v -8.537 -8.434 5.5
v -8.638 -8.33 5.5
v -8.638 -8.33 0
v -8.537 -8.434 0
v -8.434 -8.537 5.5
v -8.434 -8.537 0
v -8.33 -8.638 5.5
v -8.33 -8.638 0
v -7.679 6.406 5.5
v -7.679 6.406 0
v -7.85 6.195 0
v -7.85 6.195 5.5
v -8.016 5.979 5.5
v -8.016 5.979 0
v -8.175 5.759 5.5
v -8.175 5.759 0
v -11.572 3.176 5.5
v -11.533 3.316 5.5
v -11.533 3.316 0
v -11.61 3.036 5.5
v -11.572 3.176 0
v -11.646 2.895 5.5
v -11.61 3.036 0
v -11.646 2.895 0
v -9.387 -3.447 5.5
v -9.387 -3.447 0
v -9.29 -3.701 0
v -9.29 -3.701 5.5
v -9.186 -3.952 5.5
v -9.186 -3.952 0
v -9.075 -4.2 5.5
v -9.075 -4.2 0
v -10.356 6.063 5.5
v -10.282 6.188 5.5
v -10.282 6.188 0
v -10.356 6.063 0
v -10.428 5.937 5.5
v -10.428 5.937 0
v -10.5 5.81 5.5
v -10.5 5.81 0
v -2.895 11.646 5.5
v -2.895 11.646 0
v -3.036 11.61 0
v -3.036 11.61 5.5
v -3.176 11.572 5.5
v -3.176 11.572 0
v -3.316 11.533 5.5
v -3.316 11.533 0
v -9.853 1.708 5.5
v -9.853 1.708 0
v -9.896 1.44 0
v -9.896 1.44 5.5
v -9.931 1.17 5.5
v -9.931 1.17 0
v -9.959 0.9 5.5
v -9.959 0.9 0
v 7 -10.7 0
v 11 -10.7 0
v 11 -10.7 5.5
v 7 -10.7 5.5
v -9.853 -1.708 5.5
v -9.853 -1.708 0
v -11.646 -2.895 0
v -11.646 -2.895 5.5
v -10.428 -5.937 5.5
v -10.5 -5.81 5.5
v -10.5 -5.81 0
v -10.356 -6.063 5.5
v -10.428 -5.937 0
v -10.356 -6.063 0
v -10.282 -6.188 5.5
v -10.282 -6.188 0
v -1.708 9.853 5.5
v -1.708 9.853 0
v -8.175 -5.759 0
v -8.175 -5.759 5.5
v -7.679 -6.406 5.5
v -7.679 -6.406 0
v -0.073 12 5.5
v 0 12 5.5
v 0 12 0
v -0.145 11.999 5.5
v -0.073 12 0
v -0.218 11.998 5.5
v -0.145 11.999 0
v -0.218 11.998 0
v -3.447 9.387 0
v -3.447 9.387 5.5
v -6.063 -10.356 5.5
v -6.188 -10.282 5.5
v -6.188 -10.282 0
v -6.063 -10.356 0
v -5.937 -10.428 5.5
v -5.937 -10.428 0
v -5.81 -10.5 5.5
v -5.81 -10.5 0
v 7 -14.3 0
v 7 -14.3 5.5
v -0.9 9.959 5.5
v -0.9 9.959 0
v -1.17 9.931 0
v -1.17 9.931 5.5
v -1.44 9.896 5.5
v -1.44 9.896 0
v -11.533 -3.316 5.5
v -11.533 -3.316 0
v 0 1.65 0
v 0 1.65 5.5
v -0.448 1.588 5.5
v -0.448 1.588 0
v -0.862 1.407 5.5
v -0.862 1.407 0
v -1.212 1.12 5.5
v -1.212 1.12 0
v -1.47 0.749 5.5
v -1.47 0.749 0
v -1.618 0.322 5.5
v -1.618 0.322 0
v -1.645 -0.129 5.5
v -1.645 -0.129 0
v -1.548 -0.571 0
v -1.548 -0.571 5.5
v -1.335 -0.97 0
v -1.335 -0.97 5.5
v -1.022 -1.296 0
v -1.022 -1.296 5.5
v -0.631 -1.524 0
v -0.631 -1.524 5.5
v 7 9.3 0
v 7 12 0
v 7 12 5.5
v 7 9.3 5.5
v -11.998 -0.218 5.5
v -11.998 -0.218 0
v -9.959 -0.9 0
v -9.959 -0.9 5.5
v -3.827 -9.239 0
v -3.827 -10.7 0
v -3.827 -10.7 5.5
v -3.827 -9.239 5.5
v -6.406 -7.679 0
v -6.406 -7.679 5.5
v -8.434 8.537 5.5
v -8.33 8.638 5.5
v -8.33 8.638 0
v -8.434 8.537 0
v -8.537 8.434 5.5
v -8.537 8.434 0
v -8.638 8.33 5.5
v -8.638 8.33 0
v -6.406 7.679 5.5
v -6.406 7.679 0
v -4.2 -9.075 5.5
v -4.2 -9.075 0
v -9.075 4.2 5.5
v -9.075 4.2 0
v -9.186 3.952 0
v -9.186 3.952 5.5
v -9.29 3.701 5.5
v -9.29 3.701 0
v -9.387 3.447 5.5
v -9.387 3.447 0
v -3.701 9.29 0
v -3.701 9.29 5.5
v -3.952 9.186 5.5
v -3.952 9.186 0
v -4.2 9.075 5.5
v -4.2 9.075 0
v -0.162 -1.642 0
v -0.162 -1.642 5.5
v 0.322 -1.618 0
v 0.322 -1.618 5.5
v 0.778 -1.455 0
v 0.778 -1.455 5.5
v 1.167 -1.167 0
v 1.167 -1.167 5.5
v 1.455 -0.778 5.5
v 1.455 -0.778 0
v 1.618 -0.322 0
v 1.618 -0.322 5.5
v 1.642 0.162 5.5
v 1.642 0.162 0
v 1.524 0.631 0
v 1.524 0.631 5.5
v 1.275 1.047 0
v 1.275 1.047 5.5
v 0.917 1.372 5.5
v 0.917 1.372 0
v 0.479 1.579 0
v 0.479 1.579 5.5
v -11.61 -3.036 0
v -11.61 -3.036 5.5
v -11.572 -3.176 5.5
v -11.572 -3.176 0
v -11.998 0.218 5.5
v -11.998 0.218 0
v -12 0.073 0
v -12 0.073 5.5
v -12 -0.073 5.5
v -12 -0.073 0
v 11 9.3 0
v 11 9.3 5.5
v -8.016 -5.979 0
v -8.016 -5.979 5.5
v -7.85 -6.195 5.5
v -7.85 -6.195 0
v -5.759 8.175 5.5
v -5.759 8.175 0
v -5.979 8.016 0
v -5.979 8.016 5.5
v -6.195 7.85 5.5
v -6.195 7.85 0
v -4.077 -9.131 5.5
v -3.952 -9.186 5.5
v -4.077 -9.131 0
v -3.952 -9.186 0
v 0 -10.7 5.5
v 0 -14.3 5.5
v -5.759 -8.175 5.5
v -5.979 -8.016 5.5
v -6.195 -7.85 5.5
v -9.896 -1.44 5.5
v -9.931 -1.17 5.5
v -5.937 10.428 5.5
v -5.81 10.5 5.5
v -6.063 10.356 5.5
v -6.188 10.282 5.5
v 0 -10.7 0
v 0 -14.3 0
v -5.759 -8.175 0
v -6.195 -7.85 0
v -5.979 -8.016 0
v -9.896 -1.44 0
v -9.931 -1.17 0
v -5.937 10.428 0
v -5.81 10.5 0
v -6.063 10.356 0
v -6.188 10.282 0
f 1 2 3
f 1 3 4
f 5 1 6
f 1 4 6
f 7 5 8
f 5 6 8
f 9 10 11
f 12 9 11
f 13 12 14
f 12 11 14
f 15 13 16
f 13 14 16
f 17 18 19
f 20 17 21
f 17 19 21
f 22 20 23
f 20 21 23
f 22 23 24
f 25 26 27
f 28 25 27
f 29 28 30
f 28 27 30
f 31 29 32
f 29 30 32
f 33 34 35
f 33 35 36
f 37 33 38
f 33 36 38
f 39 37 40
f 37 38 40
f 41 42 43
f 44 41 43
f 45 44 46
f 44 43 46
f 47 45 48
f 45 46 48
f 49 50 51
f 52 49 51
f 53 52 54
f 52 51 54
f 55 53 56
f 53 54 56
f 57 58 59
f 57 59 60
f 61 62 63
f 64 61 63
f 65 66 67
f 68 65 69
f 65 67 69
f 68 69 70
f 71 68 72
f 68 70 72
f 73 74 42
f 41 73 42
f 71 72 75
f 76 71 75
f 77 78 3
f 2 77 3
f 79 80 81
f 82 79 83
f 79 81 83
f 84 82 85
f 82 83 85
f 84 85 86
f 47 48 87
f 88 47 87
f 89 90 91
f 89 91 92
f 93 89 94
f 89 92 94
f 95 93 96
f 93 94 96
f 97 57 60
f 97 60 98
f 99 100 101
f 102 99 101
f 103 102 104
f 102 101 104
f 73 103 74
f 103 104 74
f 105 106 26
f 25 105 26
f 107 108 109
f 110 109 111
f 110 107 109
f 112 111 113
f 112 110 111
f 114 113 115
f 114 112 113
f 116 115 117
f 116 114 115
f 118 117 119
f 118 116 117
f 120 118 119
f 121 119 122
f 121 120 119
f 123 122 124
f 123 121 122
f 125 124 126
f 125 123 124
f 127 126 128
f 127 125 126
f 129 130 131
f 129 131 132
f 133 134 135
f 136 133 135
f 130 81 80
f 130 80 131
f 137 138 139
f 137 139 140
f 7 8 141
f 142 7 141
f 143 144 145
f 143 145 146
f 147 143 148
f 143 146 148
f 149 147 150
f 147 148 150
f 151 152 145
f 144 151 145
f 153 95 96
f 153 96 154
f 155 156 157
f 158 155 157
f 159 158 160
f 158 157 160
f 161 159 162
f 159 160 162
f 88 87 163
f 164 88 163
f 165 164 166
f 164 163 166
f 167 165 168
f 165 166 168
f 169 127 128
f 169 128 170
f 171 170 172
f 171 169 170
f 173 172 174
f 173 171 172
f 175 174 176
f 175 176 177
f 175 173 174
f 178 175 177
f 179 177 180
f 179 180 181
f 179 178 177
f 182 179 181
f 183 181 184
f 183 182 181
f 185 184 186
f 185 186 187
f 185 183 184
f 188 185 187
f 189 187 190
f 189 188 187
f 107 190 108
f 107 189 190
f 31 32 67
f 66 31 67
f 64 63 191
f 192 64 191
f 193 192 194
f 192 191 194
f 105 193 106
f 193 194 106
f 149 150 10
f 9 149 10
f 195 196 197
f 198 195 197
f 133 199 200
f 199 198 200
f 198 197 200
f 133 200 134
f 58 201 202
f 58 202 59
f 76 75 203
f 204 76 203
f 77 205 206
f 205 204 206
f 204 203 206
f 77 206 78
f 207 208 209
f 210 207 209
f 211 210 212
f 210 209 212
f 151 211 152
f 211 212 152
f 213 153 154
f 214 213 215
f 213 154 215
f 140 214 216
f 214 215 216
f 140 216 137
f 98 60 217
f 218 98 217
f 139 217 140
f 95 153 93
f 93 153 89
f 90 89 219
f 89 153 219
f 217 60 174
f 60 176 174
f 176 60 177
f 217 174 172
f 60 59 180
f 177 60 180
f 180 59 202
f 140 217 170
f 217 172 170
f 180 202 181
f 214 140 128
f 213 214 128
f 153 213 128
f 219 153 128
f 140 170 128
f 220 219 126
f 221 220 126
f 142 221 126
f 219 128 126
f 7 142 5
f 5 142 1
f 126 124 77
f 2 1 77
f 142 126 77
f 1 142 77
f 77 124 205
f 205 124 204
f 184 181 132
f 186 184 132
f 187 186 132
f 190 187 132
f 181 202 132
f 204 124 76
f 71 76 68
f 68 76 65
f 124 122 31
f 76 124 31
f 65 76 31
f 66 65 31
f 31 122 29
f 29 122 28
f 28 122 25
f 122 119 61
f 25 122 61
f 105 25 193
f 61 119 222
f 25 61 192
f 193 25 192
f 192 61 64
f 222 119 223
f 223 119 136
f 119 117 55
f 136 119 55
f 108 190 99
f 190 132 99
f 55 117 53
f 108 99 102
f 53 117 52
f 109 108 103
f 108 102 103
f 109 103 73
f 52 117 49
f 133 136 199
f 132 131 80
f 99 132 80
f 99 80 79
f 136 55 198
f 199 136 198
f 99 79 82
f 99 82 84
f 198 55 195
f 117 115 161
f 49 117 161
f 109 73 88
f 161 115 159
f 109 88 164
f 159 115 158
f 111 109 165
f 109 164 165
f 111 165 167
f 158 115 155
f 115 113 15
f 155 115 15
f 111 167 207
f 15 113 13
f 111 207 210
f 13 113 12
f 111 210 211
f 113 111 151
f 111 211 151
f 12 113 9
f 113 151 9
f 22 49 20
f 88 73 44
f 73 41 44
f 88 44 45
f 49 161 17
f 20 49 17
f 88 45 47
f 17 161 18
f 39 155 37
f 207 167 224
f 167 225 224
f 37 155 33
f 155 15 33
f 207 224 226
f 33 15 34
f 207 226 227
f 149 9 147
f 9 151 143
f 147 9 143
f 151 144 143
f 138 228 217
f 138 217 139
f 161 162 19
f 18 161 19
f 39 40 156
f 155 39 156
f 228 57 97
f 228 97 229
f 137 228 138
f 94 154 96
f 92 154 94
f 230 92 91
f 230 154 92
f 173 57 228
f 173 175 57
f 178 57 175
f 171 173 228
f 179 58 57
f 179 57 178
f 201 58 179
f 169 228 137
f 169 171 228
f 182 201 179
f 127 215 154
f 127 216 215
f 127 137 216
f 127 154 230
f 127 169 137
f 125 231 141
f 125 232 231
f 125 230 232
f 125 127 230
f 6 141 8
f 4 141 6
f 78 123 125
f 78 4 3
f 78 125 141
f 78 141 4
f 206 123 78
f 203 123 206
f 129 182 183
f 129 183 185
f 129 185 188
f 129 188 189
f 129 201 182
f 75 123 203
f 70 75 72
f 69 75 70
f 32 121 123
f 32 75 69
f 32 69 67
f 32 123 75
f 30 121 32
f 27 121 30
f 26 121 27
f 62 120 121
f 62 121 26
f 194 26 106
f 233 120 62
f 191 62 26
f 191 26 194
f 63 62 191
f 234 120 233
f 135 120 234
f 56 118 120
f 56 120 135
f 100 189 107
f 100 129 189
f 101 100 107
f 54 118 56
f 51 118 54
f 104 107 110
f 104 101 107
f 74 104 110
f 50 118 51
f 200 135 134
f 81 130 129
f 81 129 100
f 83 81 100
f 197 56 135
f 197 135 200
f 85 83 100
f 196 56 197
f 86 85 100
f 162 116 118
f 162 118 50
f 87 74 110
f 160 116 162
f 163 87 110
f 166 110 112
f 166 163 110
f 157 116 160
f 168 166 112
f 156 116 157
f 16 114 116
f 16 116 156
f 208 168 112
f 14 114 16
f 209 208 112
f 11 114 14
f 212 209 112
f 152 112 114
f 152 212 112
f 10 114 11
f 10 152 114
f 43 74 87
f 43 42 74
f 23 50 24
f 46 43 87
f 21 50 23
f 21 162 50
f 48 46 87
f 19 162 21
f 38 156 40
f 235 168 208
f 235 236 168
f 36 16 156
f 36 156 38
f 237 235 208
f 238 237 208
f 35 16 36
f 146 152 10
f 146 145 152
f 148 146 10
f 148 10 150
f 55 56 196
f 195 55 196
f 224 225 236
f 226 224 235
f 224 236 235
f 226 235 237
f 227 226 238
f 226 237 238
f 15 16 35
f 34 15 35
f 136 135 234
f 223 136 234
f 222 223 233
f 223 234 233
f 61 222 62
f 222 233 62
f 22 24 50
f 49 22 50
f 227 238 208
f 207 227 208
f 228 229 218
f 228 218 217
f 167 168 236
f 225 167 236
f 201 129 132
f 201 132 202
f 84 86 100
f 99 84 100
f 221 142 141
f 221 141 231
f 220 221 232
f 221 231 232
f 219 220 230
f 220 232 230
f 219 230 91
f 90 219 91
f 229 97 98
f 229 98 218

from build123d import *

# Parameters (mm, degrees)
SKETCH1_R           = 10
BOSS_EXTRUDE1_DEPTH = 5.5
BOSS_EXTRUDE2_DEPTH = 5.5
CIRPATTERN1_COUNT   = 24
SKETCH3_R           = 12.65
SKETCH3_R_2         = 12
CUT_EXTRUDE1_DEPTH  = 6
CUT_EXTRUDE2_DEPTH  = 6
SKETCH5_R           = 1.65
CUT_EXTRUDE3_DEPTH  = 6
BOSS_EXTRUDE3_DEPTH = 5.5


with BuildPart() as part:
    # Sketch1 → Boss-Extrude1 (new body)
    with BuildSketch(Plane.XY):
        Circle(SKETCH1_R)
    extrude(amount=BOSS_EXTRUDE1_DEPTH)

    # Sketch2 → Boss-Extrude2 (add)
    with BuildSketch(Plane.XY):
        with BuildLine():
            Line((0, 12.65), (-0.9, 9.959417654))
            ThreePointArc((-0.9, 9.959417654), (0, 10), (0.9, 9.959417654))
            Line((0.9, 9.959417654), (0, 12.65))
        make_face()
    boss_extrude2 = extrude(amount=BOSS_EXTRUDE2_DEPTH)

    # CirPattern1: Boss-Extrude2 ×24 about axis
    cirpattern1_axis = Axis((0, 0, 0), (0, 0, 1))
    for i in range(1, CIRPATTERN1_COUNT):
        add(boss_extrude2.rotate(cirpattern1_axis, i * 360 / CIRPATTERN1_COUNT))

    # Sketch3 → Cut-Extrude1 (cut)
    with BuildSketch(Plane.XY):
        Circle(SKETCH3_R)
        Circle(SKETCH3_R_2, mode=Mode.SUBTRACT)
    extrude(amount=CUT_EXTRUDE1_DEPTH, mode=Mode.SUBTRACT)

    # Sketch4 → Cut-Extrude2 (cut)
    with BuildSketch(Plane.XY):
        with BuildLine():
            Line((0, 0), (0, 12))
            ThreePointArc((0, 12), (11.769423365, -2.341083864), (-4.592201188, -11.08655439))
            Line((-4.592201188, -11.08655439), (-3.826834324, -9.238795325))
            Line((-3.826834324, -9.238795325), (0, 0))
        make_face()
    extrude(amount=CUT_EXTRUDE2_DEPTH, mode=Mode.SUBTRACT)

    # Sketch5 → Cut-Extrude3 (cut)
    with BuildSketch(Plane.XY):
        Circle(SKETCH5_R)
    extrude(amount=CUT_EXTRUDE3_DEPTH, mode=Mode.SUBTRACT)

    # Sketch6 → Boss-Extrude3 (add)
    with BuildSketch(Plane.XY):
        with BuildLine():
            Line((0, 1.65), (0, 12))
            Line((0, 12), (7, 12))
            Line((7, 12), (7, 9.3))
            Line((7, 9.3), (11, 9.3))
            Line((11, 9.3), (11, -10.7))
            Line((11, -10.7), (7, -10.7))
            Line((7, -10.7), (7, -14.3))
            Line((7, -14.3), (0, -14.3))
            Line((0, -14.3), (0, -10.7))
            Line((0, -10.7), (-3.826834324, -10.7))
            Line((-3.826834324, -10.7), (-3.826834324, -9.238795325))
            Line((-3.826834324, -9.238795325), (-0.631427663, -1.524401229))
            ThreePointArc((-0.631427663, -1.524401229), (1.618295713, -0.321899031), (0, 1.65))
        make_face()
    extrude(amount=BOSS_EXTRUDE3_DEPTH)


solid = part.part
